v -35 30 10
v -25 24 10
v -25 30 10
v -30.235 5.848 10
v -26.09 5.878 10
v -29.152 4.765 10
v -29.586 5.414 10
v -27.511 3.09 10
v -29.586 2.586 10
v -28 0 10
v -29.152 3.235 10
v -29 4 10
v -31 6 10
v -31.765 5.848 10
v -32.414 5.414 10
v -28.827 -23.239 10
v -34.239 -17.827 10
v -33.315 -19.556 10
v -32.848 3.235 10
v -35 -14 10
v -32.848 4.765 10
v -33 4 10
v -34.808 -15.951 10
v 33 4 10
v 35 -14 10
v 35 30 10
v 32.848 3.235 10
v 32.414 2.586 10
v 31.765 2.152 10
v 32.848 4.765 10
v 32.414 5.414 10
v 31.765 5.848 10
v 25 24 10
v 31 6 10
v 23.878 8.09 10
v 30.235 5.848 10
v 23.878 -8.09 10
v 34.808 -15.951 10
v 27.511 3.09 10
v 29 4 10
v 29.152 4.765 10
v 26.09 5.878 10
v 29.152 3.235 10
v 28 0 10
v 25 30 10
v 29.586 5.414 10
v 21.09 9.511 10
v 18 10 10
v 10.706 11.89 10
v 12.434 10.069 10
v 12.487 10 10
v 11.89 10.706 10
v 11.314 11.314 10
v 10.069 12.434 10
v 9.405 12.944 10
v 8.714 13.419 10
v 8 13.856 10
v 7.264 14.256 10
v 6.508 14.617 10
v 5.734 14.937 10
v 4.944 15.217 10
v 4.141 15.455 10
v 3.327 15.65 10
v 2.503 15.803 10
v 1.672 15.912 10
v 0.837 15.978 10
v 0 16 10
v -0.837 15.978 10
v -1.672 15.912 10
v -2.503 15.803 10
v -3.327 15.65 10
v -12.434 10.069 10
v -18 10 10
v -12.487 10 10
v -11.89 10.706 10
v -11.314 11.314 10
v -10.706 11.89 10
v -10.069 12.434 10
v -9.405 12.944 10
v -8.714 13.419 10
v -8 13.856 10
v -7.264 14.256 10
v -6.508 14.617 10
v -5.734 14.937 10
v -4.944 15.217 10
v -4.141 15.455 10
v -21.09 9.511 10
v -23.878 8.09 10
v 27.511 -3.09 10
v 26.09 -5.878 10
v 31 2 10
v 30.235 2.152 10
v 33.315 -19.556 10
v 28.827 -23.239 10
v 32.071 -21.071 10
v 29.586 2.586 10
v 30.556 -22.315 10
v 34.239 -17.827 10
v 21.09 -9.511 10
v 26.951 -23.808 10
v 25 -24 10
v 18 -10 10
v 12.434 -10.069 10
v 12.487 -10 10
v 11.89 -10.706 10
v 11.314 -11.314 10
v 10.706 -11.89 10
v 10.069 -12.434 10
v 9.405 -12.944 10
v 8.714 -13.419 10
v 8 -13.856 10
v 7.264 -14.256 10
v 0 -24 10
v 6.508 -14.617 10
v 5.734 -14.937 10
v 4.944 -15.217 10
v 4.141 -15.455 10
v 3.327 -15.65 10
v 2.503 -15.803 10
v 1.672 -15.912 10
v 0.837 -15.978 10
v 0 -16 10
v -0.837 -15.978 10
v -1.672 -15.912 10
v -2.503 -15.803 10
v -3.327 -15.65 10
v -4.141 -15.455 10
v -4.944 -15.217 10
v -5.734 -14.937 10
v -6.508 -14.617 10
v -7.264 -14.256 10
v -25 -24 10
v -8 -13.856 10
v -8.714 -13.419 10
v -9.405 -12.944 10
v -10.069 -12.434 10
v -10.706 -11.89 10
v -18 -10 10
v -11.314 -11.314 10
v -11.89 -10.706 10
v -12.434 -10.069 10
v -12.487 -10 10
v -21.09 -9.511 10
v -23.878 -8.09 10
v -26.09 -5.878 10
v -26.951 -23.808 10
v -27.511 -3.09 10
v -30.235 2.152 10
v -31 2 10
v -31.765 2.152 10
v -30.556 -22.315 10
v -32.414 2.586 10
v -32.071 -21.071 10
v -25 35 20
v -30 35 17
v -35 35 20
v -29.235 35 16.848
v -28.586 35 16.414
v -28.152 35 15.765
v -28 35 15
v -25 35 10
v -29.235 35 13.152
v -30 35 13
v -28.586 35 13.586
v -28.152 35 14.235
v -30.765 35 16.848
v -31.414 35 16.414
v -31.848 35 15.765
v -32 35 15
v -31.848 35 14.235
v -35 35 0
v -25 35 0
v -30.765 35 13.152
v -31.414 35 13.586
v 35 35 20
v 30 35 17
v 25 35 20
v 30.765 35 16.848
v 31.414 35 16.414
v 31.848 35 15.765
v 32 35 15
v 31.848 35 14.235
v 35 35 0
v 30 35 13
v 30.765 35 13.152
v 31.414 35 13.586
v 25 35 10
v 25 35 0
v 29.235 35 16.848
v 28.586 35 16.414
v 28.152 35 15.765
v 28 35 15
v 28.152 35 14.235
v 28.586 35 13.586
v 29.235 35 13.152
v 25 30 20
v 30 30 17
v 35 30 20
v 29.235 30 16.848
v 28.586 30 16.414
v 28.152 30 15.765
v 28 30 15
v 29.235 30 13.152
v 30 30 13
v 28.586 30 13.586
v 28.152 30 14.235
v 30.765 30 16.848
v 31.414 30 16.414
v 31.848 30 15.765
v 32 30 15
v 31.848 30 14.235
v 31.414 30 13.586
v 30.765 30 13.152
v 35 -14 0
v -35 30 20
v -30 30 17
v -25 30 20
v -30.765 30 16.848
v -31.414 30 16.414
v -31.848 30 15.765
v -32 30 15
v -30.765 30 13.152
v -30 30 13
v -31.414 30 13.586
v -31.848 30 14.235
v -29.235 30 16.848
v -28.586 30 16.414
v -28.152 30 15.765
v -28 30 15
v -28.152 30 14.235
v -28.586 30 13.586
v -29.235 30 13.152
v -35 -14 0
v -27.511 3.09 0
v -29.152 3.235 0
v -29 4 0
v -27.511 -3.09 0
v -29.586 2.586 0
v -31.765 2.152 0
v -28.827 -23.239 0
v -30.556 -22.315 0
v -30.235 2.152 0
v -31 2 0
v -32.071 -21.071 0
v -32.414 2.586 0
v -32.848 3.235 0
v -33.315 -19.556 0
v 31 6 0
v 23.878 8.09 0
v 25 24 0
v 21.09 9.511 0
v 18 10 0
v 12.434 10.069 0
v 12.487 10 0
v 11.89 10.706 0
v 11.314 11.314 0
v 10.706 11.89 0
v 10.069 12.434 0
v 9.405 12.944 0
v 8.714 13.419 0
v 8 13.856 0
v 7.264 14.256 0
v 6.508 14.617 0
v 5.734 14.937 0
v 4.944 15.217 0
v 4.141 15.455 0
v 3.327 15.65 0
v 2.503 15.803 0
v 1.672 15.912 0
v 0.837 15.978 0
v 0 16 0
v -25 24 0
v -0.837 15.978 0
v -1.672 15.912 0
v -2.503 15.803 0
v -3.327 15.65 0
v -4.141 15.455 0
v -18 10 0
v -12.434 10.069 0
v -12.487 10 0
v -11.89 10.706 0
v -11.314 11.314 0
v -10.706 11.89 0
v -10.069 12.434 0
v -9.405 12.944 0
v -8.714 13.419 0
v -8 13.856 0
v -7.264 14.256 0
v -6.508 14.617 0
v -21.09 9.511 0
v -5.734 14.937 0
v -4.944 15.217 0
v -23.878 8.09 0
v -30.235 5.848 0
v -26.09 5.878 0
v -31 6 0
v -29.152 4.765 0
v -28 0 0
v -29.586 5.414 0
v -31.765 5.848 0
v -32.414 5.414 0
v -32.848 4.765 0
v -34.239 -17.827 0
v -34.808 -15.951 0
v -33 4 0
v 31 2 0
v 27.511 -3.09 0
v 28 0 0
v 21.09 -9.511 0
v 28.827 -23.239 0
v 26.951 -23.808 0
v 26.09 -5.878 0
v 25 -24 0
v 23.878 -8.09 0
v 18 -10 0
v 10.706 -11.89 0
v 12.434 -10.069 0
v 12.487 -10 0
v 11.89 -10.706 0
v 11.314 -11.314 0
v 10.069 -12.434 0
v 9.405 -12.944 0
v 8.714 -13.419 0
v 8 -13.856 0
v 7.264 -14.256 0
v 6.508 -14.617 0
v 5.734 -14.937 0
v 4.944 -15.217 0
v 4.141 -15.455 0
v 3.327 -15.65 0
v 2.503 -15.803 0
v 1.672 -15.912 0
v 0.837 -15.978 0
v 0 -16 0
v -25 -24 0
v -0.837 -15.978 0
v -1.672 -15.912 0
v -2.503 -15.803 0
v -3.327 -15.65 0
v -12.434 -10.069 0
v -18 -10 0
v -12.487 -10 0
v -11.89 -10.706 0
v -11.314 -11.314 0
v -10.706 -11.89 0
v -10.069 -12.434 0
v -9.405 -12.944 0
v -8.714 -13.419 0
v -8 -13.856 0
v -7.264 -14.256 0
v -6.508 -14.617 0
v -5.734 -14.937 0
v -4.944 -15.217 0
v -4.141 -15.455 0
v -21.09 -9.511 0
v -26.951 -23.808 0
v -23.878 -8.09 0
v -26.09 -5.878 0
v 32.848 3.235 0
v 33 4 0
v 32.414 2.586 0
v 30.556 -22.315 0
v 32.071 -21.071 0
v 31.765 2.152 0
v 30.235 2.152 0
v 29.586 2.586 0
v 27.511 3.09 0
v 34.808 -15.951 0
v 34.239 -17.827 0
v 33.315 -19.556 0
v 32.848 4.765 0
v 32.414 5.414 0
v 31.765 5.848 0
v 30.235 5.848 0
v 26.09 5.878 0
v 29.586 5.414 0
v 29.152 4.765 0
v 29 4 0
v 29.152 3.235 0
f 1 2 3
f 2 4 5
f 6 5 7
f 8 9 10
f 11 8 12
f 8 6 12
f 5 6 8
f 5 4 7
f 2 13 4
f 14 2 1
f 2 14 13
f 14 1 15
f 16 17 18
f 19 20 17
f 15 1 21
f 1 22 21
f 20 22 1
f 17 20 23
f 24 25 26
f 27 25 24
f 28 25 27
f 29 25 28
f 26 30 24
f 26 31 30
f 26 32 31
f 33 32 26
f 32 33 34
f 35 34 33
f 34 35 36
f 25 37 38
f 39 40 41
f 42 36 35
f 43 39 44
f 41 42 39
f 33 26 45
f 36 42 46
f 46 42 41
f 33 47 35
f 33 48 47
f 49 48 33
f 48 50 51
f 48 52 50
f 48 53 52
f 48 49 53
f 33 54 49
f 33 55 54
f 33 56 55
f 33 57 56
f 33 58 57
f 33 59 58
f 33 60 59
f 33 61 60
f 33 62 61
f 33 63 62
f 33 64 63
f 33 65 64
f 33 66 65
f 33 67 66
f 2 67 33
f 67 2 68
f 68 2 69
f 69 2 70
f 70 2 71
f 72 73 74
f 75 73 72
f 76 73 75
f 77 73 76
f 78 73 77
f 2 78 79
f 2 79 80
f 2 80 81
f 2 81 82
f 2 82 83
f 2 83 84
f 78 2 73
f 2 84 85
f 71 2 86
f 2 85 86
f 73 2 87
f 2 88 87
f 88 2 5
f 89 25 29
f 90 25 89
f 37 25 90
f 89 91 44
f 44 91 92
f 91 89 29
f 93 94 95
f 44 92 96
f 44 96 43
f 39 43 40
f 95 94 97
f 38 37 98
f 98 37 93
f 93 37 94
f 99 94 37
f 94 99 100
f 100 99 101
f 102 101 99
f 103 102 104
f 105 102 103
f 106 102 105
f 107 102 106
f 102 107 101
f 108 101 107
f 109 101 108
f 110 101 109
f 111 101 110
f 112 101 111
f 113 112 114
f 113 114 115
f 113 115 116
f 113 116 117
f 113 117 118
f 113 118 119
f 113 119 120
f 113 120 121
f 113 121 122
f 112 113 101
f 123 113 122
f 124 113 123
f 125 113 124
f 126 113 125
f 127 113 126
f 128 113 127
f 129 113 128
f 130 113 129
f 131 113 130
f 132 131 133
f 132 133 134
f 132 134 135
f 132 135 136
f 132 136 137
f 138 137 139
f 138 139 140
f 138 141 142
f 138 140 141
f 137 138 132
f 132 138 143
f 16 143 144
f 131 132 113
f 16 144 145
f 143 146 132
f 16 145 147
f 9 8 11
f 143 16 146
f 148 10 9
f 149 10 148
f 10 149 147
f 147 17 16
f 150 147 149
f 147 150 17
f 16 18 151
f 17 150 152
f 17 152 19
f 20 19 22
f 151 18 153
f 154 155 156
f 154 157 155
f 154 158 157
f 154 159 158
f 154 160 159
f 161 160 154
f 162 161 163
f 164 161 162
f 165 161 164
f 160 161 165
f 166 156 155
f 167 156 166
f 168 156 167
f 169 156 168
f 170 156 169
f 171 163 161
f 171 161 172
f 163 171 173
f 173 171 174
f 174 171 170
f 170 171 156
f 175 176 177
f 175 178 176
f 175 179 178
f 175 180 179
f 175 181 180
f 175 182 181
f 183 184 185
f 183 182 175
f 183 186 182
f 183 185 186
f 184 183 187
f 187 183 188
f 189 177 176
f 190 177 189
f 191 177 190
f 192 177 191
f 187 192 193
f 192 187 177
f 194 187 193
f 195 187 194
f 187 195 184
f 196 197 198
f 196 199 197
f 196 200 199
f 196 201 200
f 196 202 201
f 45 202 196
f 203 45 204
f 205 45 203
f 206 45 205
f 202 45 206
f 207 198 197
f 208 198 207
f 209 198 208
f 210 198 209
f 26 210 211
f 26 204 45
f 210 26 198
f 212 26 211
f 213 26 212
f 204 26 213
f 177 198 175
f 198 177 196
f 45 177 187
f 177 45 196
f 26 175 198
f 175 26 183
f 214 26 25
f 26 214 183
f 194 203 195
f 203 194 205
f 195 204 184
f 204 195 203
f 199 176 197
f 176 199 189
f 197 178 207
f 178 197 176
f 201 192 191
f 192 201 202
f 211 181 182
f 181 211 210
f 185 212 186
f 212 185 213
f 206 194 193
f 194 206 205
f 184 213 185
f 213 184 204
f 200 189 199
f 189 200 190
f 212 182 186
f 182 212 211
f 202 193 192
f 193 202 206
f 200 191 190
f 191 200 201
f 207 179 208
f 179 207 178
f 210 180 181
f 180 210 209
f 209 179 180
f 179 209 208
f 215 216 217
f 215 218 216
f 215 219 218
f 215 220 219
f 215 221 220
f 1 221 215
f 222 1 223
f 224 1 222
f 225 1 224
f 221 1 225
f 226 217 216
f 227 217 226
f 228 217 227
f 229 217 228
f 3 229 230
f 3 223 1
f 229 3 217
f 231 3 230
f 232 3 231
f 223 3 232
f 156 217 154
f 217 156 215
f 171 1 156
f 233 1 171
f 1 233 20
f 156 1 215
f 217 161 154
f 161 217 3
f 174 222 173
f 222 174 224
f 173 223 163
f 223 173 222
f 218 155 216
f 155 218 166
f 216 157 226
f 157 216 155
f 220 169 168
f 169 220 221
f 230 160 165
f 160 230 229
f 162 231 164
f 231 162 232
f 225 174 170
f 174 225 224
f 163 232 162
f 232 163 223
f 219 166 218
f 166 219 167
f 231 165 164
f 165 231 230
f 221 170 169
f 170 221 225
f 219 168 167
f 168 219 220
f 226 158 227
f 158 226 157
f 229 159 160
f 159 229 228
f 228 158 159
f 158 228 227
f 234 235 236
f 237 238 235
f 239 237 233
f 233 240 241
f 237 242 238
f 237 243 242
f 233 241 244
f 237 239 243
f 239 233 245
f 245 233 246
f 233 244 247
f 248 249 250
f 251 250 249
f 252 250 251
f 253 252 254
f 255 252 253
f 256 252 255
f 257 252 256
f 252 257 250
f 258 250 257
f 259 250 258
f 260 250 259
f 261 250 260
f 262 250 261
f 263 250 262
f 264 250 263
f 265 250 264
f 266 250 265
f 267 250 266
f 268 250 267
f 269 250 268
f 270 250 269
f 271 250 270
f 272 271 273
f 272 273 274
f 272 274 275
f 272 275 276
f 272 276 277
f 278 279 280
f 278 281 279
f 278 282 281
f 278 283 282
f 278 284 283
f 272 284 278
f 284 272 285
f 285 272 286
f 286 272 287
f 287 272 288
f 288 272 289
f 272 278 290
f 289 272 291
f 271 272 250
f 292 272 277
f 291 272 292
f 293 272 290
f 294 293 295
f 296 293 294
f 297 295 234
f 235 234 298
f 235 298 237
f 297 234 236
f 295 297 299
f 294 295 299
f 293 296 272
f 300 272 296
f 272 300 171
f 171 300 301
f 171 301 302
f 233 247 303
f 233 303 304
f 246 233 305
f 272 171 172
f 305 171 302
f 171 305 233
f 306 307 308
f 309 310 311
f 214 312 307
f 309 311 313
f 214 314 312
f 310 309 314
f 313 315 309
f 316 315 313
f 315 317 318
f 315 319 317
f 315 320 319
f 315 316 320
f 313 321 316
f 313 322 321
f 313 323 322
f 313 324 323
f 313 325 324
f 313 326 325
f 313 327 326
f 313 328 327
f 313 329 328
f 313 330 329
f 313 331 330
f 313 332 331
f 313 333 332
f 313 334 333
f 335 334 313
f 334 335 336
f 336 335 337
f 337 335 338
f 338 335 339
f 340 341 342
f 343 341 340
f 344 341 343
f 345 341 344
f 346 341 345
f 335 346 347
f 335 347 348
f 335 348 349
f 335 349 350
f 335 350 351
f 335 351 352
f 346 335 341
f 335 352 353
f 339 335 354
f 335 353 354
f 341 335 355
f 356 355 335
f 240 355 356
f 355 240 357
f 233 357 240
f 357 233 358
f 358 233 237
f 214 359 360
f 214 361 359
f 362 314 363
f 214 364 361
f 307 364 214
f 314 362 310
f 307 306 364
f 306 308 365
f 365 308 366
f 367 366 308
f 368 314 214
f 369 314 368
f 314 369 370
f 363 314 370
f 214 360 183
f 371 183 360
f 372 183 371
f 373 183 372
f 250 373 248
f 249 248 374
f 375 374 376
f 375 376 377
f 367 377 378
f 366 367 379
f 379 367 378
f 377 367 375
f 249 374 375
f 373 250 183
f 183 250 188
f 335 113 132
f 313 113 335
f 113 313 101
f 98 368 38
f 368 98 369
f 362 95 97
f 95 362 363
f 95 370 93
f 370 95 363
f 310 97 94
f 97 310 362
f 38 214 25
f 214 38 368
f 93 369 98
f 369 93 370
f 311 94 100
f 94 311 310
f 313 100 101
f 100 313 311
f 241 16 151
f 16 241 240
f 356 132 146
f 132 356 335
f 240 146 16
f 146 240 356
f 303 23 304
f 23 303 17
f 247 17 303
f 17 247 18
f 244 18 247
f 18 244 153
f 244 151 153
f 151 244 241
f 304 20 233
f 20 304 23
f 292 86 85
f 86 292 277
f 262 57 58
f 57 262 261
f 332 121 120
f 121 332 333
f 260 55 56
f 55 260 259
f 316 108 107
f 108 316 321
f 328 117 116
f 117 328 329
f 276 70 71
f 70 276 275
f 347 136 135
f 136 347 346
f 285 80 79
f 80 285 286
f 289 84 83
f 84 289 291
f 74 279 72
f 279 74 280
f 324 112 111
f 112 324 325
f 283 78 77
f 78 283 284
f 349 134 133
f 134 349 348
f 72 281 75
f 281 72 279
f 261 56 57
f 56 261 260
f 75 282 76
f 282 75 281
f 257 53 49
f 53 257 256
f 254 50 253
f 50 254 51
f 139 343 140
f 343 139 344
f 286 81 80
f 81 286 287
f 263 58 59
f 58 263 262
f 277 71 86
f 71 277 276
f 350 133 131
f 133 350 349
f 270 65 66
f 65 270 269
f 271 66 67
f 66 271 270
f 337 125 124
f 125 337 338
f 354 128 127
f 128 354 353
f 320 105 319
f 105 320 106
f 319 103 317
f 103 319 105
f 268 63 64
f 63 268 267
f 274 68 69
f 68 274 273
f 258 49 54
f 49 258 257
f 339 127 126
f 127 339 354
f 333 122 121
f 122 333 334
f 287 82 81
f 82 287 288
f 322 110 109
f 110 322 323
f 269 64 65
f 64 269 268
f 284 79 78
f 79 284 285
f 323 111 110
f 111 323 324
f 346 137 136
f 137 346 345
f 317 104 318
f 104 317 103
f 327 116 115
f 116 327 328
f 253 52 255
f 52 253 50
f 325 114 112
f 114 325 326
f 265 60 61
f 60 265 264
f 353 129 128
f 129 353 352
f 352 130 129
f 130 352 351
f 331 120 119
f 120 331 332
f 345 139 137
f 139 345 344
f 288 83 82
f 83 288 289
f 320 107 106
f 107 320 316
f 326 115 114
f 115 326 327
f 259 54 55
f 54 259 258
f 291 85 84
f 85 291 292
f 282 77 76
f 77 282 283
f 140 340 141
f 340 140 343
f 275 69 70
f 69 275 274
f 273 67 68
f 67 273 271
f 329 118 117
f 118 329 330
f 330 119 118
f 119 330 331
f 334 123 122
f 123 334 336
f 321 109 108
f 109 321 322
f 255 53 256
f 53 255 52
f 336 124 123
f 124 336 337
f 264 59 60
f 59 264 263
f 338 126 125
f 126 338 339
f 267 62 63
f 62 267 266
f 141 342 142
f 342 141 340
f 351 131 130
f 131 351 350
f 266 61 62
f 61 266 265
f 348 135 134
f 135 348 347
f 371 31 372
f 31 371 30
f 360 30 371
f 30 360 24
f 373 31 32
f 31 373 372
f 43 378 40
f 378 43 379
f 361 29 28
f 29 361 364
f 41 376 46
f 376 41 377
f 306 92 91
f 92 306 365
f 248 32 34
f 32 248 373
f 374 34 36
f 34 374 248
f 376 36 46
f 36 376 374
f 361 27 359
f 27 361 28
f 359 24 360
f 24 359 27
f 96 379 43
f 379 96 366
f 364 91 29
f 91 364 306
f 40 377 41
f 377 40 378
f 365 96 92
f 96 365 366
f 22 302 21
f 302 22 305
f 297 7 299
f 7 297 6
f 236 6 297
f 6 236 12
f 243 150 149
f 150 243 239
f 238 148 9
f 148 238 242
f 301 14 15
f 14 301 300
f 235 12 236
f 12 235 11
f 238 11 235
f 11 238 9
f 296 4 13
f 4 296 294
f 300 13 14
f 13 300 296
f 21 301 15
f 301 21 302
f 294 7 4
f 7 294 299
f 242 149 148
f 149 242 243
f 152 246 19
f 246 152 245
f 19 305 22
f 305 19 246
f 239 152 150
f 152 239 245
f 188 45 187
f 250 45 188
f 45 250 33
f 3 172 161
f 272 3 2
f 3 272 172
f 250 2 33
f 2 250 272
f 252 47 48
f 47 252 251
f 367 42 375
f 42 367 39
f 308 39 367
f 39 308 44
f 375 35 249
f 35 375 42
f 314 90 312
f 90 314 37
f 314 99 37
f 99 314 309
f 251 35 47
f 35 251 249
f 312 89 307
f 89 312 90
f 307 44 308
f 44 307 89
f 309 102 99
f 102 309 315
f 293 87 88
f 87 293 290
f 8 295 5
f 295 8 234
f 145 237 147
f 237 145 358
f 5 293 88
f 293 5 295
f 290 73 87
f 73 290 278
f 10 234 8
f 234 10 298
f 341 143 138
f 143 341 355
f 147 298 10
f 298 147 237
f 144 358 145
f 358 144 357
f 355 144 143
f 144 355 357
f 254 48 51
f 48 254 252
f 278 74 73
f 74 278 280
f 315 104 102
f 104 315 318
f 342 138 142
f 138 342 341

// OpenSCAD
module Feet()
{
rotate([0, 90, 90])
difference (){
  translate([0, 0, 2.5])
    cube([10, 10, 5], center=true);
  cylinder($fn=16, 5, 2, 2);
}
}

module Snap_a ()
{
translate([22.75, 0, 8.5])
cube([1.5, 10, 17], center=true);
translate([20, 0, 16.0])
cube([4, 10, 2], center=true);
translate([-22.75, 0, 8.5])
cube([1.5, 10, 17], center=true);
translate([-20, 0, 16.0])
cube([4, 10, 2], center=true);
}

module Snap () {
difference() {
Snap_a();
translate([0, 0, 14])
cylinder($fn=120, 3, 21.75, 22);
}
}

module Crown (){
    cylinder($fn=120, 3, 19, 19);
    for (a =[0:6:359])
        translate([19 * sin(a), 19 * cos(a), 0])
            cylinder($fn=10, 3, .9, .9);
}

module Base ()
{
translate([0, 5.5, 5]) cube([70, 59, 10], center=true);

// translate([0, 0, 10]) cylinder($fn=120, 10, 24, 24);
// translate([0, 0, 10]) Snap();
// translate([0,0, 20]) Crown();

translate([30, 30, 15])
  Feet();
translate([-30, 30, 15])
  Feet();
}

module Edge_Rounding () {
   difference() {
   translate([0, 0,  5]) cube([20, 20, 10], center=true);
   translate([10, 10, 0]) cylinder($fn=32, 10, 10, 10);
   translate([-10, 10, 0]) cylinder($fn=32, 10, 10, 10);
   translate([-10, -10, 0]) cylinder($fn=32, 10, 10, 10);
   translate([10, -10, 0]) cylinder($fn=32, 10, 10, 10);
   }
}

difference () {
    Base();
    cylinder($fn=120, 23, 16, 16);
    translate([31, 4, 0])
       cylinder($fn=16, 10, 2, 2);
    translate([-31, 4, 0])
       cylinder($fn=16, 10, 2, 2);
    translate([0, 0, 15])
      rotate ([90, 0, 0])
        cylinder($fn=32, 24, 5, 5);
    translate([0, -24,  20])
       cube([10, 24, 10], center=true);
    translate([0, 29.5, 5])
      cube([50, 11, 10], center=true);
    translate([35, -24, 0]) Edge_Rounding();
    translate([-35, -24, 0]) Edge_Rounding();
    
    translate([18, 0, 0]) cylinder($fn=20, 10, 10, 10); 
    translate([-18, 0, 0]) cylinder($fn=20, 10, 10, 10); 
    translate([0, 0, 5]) cube([36, 20, 10], center=true);
}
